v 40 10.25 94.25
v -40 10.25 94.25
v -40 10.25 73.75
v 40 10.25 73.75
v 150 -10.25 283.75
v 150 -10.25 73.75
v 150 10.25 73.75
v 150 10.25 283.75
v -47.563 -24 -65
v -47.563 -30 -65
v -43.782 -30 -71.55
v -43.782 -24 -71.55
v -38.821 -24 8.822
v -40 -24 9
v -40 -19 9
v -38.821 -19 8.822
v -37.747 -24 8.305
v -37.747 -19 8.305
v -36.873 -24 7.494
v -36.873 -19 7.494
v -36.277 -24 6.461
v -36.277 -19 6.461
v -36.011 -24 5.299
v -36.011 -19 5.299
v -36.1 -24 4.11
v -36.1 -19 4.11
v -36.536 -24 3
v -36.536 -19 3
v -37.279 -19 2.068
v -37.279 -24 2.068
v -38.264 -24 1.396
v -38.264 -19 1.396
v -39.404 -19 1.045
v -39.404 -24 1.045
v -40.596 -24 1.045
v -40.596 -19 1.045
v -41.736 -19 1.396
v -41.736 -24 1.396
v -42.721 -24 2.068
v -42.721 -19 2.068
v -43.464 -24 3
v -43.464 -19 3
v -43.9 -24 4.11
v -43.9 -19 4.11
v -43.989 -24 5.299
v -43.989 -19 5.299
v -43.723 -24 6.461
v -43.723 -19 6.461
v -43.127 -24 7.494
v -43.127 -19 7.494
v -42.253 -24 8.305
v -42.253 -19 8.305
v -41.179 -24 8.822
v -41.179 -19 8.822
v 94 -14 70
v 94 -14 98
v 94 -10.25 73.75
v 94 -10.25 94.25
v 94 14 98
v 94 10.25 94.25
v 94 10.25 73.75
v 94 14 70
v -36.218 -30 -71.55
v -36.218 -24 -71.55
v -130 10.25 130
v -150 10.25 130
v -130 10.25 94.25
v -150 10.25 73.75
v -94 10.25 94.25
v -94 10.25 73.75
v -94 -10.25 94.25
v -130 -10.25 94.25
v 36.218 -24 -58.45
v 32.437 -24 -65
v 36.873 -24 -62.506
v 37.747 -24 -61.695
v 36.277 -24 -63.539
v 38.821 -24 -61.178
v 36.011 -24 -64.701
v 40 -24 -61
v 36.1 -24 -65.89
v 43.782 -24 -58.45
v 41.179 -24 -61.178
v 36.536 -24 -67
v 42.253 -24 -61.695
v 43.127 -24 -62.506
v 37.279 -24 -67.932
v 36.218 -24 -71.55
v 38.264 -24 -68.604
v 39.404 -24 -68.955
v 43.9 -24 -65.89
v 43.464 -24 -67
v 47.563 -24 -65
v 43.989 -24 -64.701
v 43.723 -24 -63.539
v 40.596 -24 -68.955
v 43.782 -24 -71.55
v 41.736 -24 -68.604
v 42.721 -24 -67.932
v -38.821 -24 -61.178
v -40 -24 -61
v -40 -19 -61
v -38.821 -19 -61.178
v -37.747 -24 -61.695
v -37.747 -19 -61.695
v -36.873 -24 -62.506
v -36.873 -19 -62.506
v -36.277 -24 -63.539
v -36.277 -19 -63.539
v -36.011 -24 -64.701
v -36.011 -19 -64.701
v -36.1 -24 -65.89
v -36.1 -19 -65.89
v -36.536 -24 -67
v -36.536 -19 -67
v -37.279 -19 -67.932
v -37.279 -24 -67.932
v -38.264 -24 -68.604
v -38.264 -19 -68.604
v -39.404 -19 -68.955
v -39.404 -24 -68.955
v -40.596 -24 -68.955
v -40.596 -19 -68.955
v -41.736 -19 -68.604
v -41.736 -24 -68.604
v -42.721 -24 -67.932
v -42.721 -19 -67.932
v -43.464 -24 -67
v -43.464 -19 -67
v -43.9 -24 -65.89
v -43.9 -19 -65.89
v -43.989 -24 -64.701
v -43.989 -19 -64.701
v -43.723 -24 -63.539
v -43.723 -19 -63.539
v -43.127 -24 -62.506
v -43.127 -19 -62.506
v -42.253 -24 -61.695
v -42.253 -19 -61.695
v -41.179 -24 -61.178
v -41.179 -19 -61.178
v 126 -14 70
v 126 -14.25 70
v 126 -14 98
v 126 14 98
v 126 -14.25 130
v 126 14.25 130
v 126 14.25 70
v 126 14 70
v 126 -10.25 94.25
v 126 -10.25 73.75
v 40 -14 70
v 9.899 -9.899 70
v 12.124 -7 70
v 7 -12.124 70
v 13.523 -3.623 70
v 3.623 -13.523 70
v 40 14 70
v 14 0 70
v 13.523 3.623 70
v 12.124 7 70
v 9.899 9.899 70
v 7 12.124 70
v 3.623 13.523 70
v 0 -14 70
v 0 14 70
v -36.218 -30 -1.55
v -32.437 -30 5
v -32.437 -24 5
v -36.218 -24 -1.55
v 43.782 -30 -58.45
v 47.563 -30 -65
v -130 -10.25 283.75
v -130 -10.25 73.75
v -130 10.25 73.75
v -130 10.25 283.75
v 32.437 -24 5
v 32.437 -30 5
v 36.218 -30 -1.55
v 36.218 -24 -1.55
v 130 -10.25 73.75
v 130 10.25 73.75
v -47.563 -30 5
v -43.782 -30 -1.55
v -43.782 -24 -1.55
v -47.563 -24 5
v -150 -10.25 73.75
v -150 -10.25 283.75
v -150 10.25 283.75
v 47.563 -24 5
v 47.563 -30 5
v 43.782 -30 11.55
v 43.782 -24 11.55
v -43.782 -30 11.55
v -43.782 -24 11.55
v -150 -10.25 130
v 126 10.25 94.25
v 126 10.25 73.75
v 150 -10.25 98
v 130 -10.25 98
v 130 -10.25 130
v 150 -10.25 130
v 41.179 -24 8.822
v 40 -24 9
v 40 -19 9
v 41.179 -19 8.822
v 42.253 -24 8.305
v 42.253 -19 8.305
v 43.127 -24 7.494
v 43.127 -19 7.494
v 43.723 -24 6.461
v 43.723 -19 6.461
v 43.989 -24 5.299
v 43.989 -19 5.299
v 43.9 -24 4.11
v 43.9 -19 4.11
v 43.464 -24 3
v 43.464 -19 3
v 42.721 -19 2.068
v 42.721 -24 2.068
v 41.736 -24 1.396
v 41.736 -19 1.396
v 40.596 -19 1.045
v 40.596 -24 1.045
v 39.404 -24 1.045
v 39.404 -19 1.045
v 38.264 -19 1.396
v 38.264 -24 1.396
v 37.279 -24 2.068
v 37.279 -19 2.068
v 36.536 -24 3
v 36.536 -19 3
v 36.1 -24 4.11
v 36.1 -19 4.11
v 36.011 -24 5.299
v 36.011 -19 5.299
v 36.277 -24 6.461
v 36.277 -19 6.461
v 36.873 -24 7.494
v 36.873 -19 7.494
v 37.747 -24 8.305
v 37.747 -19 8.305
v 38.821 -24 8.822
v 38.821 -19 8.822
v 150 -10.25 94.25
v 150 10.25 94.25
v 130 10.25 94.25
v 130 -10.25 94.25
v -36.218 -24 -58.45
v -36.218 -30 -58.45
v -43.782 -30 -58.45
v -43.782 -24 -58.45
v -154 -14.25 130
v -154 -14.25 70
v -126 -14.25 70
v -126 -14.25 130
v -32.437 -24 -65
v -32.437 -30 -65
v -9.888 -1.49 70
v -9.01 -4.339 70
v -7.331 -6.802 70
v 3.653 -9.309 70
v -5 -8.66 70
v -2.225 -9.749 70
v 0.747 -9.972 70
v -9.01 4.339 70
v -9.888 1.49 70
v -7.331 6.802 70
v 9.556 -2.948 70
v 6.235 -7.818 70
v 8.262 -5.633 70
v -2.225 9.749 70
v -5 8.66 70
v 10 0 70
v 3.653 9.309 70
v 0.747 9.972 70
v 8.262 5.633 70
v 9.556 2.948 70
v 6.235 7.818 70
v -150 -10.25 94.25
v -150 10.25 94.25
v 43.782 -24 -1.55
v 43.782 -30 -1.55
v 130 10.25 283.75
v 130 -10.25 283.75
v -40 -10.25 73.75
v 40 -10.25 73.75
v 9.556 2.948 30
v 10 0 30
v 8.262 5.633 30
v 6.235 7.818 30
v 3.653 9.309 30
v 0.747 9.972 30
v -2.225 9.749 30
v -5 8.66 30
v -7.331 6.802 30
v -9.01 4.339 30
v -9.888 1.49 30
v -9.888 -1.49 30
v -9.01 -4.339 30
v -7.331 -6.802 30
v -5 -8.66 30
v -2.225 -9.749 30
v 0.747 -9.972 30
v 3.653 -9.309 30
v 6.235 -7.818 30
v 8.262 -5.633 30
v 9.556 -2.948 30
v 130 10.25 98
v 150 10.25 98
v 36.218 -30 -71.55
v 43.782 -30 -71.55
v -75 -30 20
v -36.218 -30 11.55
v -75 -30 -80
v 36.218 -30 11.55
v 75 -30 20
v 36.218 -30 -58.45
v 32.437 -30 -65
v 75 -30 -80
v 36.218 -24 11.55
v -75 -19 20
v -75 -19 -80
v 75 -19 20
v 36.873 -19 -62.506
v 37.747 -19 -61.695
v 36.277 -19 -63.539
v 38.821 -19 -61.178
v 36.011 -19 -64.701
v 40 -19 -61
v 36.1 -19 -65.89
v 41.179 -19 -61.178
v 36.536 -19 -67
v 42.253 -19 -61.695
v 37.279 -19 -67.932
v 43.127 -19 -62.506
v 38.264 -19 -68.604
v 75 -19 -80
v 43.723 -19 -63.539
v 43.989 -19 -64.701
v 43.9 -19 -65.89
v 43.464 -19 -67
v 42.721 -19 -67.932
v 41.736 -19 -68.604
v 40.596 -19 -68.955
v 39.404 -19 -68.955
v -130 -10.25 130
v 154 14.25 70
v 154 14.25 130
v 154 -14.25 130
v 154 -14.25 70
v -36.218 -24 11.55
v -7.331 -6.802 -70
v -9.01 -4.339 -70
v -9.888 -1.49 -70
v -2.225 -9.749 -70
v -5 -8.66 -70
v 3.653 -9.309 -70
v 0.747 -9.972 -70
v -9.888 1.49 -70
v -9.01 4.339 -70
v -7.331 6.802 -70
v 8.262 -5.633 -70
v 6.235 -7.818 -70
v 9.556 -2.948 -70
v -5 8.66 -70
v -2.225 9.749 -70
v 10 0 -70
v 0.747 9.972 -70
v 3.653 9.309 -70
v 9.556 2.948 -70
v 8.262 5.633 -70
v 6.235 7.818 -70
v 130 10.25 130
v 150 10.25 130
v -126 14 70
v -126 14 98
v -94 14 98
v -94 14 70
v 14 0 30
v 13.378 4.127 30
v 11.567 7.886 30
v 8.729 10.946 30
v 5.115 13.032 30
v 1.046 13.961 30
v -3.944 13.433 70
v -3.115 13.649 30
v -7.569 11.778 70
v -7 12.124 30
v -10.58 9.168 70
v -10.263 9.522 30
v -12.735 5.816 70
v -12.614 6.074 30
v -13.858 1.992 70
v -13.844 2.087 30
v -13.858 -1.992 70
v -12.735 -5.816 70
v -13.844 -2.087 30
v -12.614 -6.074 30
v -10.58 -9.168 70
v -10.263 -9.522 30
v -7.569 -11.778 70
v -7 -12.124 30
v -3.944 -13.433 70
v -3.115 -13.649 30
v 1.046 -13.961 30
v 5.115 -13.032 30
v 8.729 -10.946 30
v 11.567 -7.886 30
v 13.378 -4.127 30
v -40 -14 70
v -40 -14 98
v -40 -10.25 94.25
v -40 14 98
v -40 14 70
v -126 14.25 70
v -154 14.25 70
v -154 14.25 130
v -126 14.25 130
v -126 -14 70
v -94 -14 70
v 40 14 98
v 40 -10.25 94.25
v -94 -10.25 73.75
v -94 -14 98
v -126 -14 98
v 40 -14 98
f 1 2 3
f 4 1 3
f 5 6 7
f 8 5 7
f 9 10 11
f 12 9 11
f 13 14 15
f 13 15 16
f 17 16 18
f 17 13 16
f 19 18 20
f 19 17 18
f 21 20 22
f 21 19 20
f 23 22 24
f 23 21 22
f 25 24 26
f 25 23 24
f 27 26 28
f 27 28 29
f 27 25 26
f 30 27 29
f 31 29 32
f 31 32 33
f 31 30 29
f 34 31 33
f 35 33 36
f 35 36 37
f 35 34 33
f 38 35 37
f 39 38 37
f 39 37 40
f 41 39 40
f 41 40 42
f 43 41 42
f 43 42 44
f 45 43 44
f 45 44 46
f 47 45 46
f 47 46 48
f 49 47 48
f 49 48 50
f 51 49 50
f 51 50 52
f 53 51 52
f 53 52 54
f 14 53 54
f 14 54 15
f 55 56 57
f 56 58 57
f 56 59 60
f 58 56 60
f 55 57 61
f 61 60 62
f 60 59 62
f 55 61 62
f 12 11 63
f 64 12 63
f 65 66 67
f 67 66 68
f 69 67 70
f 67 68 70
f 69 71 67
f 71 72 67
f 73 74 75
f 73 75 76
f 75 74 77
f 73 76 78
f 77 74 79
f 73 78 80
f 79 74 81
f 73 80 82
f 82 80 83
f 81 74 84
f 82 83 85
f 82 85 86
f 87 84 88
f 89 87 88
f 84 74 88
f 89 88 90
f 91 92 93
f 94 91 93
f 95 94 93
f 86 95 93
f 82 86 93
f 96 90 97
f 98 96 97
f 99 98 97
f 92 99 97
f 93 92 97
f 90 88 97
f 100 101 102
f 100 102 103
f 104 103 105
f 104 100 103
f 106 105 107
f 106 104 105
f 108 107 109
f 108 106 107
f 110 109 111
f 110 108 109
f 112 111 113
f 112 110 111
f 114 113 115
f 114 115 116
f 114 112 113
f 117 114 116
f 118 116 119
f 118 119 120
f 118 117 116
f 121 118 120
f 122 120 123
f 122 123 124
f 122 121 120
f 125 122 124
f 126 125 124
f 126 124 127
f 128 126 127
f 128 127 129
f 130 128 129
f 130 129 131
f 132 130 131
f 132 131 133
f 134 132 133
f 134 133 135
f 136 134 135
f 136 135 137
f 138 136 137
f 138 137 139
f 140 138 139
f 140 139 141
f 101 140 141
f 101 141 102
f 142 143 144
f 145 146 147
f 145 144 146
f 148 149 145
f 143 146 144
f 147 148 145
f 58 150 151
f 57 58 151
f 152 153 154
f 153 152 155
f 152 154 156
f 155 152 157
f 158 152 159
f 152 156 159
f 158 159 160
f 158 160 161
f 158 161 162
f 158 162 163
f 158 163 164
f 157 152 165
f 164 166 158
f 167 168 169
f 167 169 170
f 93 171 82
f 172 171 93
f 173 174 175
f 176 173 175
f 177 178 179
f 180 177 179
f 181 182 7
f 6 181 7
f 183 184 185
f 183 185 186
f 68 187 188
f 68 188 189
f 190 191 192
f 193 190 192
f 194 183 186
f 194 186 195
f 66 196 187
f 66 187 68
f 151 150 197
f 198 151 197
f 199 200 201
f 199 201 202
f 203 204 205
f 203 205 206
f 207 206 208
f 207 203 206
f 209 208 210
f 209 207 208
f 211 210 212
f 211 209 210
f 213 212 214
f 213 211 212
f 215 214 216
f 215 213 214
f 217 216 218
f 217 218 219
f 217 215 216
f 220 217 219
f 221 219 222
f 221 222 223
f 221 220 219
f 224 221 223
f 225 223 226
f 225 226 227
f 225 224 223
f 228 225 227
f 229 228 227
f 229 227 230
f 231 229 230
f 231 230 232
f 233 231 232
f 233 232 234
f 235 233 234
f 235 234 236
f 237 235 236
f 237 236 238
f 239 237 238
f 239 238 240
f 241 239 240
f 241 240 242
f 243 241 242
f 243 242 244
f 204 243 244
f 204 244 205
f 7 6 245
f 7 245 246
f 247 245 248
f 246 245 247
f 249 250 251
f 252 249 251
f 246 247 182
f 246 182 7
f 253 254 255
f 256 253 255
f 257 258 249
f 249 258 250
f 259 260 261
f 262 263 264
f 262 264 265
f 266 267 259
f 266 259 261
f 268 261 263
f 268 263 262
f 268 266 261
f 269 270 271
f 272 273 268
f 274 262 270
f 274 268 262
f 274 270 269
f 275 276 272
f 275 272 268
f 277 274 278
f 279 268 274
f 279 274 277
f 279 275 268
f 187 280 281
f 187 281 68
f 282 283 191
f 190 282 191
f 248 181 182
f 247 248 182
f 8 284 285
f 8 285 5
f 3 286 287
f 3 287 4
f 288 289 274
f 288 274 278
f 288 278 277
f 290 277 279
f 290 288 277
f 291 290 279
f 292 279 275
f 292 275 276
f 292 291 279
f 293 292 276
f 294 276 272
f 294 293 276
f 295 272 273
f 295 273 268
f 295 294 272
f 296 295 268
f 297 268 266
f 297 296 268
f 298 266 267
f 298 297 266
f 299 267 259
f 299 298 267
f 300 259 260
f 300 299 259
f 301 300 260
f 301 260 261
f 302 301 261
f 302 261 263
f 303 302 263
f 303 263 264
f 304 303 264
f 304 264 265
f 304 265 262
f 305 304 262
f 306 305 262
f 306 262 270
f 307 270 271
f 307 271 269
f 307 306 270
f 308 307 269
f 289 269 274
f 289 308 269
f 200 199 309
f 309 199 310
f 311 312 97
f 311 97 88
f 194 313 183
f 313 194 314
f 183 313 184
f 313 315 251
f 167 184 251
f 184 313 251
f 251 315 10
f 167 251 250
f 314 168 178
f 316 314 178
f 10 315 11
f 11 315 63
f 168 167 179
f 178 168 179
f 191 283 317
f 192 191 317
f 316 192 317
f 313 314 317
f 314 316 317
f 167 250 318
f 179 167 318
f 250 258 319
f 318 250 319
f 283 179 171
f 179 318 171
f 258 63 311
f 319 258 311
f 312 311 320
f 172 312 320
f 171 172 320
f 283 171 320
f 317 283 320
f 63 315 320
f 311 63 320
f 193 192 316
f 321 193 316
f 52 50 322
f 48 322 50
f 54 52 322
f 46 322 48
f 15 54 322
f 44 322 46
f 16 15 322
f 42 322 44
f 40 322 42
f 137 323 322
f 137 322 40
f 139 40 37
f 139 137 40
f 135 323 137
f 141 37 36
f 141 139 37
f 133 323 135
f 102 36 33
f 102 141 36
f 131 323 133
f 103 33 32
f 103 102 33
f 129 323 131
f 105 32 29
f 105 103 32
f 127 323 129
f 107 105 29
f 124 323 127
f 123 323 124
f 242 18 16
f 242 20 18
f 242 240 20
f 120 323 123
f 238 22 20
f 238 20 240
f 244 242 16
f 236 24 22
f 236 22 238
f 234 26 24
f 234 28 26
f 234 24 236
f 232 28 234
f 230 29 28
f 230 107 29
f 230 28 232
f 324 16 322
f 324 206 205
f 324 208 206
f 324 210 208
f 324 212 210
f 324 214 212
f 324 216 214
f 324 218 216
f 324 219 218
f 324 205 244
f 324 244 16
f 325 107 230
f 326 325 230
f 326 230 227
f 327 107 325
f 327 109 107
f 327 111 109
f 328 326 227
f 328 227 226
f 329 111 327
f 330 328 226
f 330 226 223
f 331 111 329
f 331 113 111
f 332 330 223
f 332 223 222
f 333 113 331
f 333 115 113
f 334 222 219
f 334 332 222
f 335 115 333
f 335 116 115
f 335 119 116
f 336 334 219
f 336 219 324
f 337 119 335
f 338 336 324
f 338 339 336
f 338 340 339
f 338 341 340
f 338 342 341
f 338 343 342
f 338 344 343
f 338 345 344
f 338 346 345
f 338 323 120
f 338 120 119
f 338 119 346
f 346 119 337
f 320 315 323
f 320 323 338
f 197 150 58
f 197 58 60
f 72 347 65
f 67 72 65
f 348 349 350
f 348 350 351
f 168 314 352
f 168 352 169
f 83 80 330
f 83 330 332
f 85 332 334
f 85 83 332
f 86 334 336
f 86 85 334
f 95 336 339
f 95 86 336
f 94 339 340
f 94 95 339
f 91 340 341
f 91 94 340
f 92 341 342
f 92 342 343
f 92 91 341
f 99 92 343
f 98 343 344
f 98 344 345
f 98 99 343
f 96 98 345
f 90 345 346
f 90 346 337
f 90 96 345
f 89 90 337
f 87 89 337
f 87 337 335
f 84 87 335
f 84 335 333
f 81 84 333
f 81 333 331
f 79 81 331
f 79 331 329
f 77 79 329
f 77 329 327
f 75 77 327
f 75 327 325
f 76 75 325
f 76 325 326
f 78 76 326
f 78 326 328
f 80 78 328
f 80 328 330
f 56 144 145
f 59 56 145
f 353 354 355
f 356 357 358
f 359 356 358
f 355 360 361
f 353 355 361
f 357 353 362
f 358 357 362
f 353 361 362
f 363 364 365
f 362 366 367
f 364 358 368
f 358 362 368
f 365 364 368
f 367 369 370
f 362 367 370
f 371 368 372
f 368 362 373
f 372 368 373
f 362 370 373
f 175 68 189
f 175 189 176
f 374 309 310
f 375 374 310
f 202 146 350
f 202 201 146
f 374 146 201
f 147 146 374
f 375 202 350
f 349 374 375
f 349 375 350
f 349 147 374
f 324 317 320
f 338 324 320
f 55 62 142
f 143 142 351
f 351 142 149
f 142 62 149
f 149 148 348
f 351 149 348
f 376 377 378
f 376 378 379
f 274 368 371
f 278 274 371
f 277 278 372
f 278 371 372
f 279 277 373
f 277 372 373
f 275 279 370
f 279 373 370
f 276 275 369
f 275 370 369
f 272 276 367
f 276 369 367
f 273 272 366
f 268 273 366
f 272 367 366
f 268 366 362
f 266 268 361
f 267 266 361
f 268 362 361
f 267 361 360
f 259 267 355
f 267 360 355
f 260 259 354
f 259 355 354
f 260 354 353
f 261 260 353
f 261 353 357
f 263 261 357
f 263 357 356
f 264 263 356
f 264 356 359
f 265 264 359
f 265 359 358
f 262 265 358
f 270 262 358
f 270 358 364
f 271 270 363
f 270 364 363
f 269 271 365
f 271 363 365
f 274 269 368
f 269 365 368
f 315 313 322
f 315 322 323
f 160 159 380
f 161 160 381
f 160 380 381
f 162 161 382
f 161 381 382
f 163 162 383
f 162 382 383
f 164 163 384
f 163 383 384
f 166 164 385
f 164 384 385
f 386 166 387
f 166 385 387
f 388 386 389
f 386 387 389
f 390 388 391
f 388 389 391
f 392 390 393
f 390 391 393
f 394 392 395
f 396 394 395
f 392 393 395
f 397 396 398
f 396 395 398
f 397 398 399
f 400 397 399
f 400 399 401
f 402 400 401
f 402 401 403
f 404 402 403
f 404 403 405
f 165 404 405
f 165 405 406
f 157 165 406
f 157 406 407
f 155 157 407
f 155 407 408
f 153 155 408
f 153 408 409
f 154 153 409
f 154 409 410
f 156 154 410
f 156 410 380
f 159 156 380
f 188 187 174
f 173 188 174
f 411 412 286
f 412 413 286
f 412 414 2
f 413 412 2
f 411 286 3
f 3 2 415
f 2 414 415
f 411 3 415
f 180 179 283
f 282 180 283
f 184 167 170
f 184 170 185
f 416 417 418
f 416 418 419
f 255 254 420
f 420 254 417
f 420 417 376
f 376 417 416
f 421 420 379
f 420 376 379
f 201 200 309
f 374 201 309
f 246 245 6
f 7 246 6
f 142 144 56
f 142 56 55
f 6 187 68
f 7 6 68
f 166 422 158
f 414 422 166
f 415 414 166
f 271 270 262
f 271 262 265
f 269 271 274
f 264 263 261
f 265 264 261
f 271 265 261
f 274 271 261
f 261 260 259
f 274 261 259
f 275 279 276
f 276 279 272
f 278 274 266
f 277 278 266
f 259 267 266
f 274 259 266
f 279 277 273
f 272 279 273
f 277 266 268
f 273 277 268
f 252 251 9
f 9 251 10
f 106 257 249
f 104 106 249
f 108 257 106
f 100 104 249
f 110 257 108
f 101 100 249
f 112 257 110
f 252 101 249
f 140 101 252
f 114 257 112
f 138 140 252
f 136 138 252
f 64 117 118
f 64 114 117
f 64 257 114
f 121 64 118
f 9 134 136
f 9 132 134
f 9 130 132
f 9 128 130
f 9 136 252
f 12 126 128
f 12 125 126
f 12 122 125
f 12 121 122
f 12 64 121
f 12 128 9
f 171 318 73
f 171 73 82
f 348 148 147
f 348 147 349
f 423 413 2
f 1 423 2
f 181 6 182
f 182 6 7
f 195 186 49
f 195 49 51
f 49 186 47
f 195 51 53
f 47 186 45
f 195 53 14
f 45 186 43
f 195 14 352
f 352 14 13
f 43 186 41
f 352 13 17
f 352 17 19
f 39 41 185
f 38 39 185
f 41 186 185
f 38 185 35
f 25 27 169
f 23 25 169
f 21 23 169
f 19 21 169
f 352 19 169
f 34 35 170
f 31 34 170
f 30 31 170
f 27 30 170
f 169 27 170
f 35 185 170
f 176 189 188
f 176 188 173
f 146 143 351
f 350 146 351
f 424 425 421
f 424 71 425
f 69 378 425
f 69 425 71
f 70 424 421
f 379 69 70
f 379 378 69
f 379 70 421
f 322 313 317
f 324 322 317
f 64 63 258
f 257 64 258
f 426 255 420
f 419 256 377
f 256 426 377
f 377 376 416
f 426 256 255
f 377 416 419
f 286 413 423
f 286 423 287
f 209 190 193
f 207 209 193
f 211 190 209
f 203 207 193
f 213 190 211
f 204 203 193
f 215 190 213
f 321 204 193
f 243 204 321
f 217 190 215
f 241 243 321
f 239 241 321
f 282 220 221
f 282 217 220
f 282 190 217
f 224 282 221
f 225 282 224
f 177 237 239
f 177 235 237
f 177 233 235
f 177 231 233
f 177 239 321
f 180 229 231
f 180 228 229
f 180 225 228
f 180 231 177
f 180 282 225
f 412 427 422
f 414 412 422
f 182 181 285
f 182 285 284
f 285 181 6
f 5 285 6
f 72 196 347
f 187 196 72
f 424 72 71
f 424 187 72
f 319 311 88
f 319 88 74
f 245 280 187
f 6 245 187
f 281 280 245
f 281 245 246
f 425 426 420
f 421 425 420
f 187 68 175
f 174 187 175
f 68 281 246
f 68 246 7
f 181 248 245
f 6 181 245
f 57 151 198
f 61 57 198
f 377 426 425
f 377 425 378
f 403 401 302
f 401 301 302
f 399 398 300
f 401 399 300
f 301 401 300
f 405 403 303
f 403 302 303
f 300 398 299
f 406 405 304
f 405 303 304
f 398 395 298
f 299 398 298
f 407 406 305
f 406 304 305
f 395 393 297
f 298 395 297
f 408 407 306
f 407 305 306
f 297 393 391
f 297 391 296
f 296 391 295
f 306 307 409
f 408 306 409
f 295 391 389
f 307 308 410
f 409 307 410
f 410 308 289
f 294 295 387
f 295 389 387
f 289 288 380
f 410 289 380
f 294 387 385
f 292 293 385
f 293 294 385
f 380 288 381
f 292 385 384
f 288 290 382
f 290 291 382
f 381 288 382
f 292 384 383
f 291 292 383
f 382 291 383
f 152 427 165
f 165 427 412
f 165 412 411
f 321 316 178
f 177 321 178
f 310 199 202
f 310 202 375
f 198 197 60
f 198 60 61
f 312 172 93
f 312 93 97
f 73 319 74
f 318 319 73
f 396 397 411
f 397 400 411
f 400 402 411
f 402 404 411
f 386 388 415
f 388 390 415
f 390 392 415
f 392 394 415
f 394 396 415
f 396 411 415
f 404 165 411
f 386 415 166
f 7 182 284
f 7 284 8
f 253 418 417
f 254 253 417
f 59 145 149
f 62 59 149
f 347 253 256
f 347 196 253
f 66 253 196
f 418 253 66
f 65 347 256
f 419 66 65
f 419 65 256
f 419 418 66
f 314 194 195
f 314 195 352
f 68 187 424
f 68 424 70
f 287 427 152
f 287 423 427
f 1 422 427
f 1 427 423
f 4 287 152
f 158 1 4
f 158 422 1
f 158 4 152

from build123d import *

# Parameters (mm, degrees)
SALIENTE_EXTRUIR1_DEPTH      = 70
SALIENTE_EXTRUIR1_DEPTH_BACK = 70
CROQUIS1_R                   = 10
SALIENTE_EXTRUIR2_START      = 30
CROQUIS2_R                   = 14
CROQUIS2_R_2                 = 10
SALIENTE_EXTRUIR2_DEPTH      = 40
SALIENTE_EXTRUIR3_DEPTH      = 150
SALIENTE_EXTRUIR3_DEPTH_BACK = 150
CROQUIS3_W                   = 20.5
CROQUIS3_H                   = 20.5
SALIENTE_EXTRUIR4_DEPTH      = 40
SALIENTE_EXTRUIR4_DEPTH_BACK = 40
CROQUIS3_3_W                 = 28
CROQUIS3_3_H                 = 28
CROQUIS3_3_W_2               = 20.5
CROQUIS3_3_H_2               = 20.5
SALIENTE_EXTRUIR5_START      = 73.75
CROQUIS4_W                   = 20
CROQUIS4_H                   = 20.5
SALIENTE_EXTRUIR5_DEPTH      = 210
SALIENTE_EXTRUIR5_2_DEPTH    = 210
SALIENTE_EXTRUIR6_START      = 70
CROQUIS4_3_W                 = 28
CROQUIS4_3_H                 = 28.5
CROQUIS4_3_W_2               = 20
CROQUIS4_3_H_2               = 20.5
SALIENTE_EXTRUIR6_DEPTH      = 60
SALIENTE_EXTRUIR6_2_DEPTH    = 60
SALIENTE_EXTRUIR7_START      = -154
CROQUIS3_4_W                 = 28
CROQUIS3_4_H                 = 28
CROQUIS3_4_W_2               = 20.5
CROQUIS3_4_H_2               = 20.5
SALIENTE_EXTRUIR7_DEPTH      = 60
SALIENTE_EXTRUIR8_START      = 154
CROQUIS3_5_W                 = 28
CROQUIS3_5_H                 = 28
CROQUIS3_5_W_2               = 20.5
CROQUIS3_5_H_2               = 20.5
SALIENTE_EXTRUIR8_DEPTH      = 60
SALIENTE_EXTRUIR9_START      = -30
CROQUIS5_W                   = 150
CROQUIS5_H                   = 100
CROQUIS5_R                   = 4
SALIENTE_EXTRUIR9_DEPTH      = 11
INDENTACI_N1_START           = -130
INDENTACI_N1_OUTLINE_W       = 20.5
INDENTACI_N1_OUTLINE_H       = 20.5
INDENTACI_N1_DEPTH           = 4
INDENTACI_N1_START_2         = -150
INDENTACI_N1_2_OUTLINE_W     = 20.5
INDENTACI_N1_2_OUTLINE_H     = 3.75
INDENTACI_N1_2_DEPTH         = 20
CORTAR_EXTRUIR1_START        = -30
CORTAR_EXTRUIR1_DEPTH        = 6


# Read off the part's stored shape, not the designer's step: Indentación1
with BuildPart() as part:
    # Croquis1 → Saliente-Extruir1 (new, two sides: drawn at the far end of the back side and taken through both)
    with BuildSketch(Plane.XY.offset(-SALIENTE_EXTRUIR1_DEPTH_BACK)):
        Circle(CROQUIS1_R)
    extrude(amount=SALIENTE_EXTRUIR1_DEPTH + SALIENTE_EXTRUIR1_DEPTH_BACK)


with BuildPart() as body_2:
    # Croquis2 → Saliente-Extruir2 (new body)
    with BuildSketch(Plane.XY.offset(SALIENTE_EXTRUIR2_START)):
        Circle(CROQUIS2_R)
        Circle(CROQUIS2_R_2, mode=Mode.SUBTRACT)
    extrude(amount=SALIENTE_EXTRUIR2_DEPTH)

    # Croquis3<3> → Saliente-Extruir4 (add, two sides: drawn at the far end of the back side and taken through both)
    with BuildSketch(Plane(origin=(0, 0, 0), x_dir=(0, 0, -1), z_dir=(1, 0, 0)).offset(-SALIENTE_EXTRUIR4_DEPTH_BACK)):
        with Locations((-84, 0)):
            Rectangle(CROQUIS3_3_W, CROQUIS3_3_H)
        with Locations((-84, 0)):
            Rectangle(CROQUIS3_3_W_2, CROQUIS3_3_H_2, mode=Mode.SUBTRACT)
    extrude(amount=SALIENTE_EXTRUIR4_DEPTH + SALIENTE_EXTRUIR4_DEPTH_BACK)


with BuildPart() as body_3:
    # Croquis3 → Saliente-Extruir3 (new, two sides: drawn at the far end of the back side and taken through both)
    with BuildSketch(Plane(origin=(0, 0, 0), x_dir=(0, 0, -1), z_dir=(1, 0, 0)).offset(-SALIENTE_EXTRUIR3_DEPTH_BACK)):
        with Locations((-84, 0)):
            Rectangle(CROQUIS3_W, CROQUIS3_H)
    extrude(amount=SALIENTE_EXTRUIR3_DEPTH + SALIENTE_EXTRUIR3_DEPTH_BACK)


with BuildPart() as body_4:
    # Croquis4 → Saliente-Extruir5 (new body)
    with BuildSketch(Plane.XY.offset(SALIENTE_EXTRUIR5_START)):
        with Locations((-140, 0)):
            Rectangle(CROQUIS4_W, CROQUIS4_H)
    extrude(amount=SALIENTE_EXTRUIR5_DEPTH)


with BuildPart() as body_5:
    # Croquis4 → Saliente-Extruir5 2 (new body)
    with BuildSketch(Plane.XY.offset(SALIENTE_EXTRUIR5_START)):
        with Locations((140, 0)):
            Rectangle(CROQUIS4_W, CROQUIS4_H)
    extrude(amount=SALIENTE_EXTRUIR5_2_DEPTH)


with BuildPart() as body_6:
    # Croquis4<3> → Saliente-Extruir6 (new body)
    with BuildSketch(Plane.XY.offset(SALIENTE_EXTRUIR6_START)):
        with Locations((-140, 0)):
            Rectangle(CROQUIS4_3_W, CROQUIS4_3_H)
        with Locations((-140, 0)):
            Rectangle(CROQUIS4_3_W_2, CROQUIS4_3_H_2, mode=Mode.SUBTRACT)
    extrude(amount=SALIENTE_EXTRUIR6_DEPTH)

    # Croquis3<4> → Saliente-Extruir7 (add)
    with BuildSketch(Plane(origin=(0, 0, 0), x_dir=(0, 0, -1), z_dir=(1, 0, 0)).offset(SALIENTE_EXTRUIR7_START)):
        with Locations((-84, 0)):
            Rectangle(CROQUIS3_4_W, CROQUIS3_4_H)
        with Locations((-84, 0)):
            Rectangle(CROQUIS3_4_W_2, CROQUIS3_4_H_2, mode=Mode.SUBTRACT)
    extrude(amount=SALIENTE_EXTRUIR7_DEPTH)

    # Indentación1 outline → Indentación1 (cut)
    with BuildSketch(Plane.YZ.offset(INDENTACI_N1_START)):
        with Locations((0, 84)):
            Rectangle(INDENTACI_N1_OUTLINE_W, INDENTACI_N1_OUTLINE_H)
    extrude(amount=INDENTACI_N1_DEPTH, mode=Mode.SUBTRACT)

    # Indentaci_n1 2 outline → Indentaci_n1 2 (cut)
    with BuildSketch(Plane.YZ.offset(INDENTACI_N1_START_2)):
        with Locations((0, 96.125)):
            Rectangle(INDENTACI_N1_2_OUTLINE_W, INDENTACI_N1_2_OUTLINE_H)
    extrude(amount=INDENTACI_N1_2_DEPTH, mode=Mode.SUBTRACT)


with BuildPart() as body_7:
    # Croquis4<3> → Saliente-Extruir6 2 (new body)
    with BuildSketch(Plane.XY.offset(SALIENTE_EXTRUIR6_START)):
        with Locations((140, 0)):
            Rectangle(CROQUIS4_3_W, CROQUIS4_3_H)
        with Locations((140, 0)):
            Rectangle(CROQUIS4_3_W_2, CROQUIS4_3_H_2, mode=Mode.SUBTRACT)
    extrude(amount=SALIENTE_EXTRUIR6_2_DEPTH)

    # Croquis3<5> → Saliente-Extruir8 (add)
    with BuildSketch(Plane(origin=(0, 0, 0), x_dir=(0, 0, -1), z_dir=(1, 0, 0)).offset(SALIENTE_EXTRUIR8_START)):
        with Locations((-84, 0)):
            Rectangle(CROQUIS3_5_W, CROQUIS3_5_H)
        with Locations((-84, 0)):
            Rectangle(CROQUIS3_5_W_2, CROQUIS3_5_H_2, mode=Mode.SUBTRACT)
    extrude(amount=-SALIENTE_EXTRUIR8_DEPTH)


with BuildPart() as body_8:
    # Croquis5 → Saliente-Extruir9 (new body)
    with BuildSketch(Plane(origin=(0, 0, 0), x_dir=(1, 0, 0), z_dir=(0, 1, 0)).offset(SALIENTE_EXTRUIR9_START)):
        with Locations((0, 30)):
            Rectangle(CROQUIS5_W, CROQUIS5_H)
        with Locations(Location((40, 65, 0), (0, 0, 270))):
            Circle(CROQUIS5_R, mode=Mode.SUBTRACT)
        with Locations(Location((40, -5, 0), (0, 0, 270))):
            Circle(CROQUIS5_R, mode=Mode.SUBTRACT)
        with Locations(Location((-40, -5, 0), (0, 0, 270))):
            Circle(CROQUIS5_R, mode=Mode.SUBTRACT)
        with Locations(Location((-40, 65, 0), (0, 0, 270))):
            Circle(CROQUIS5_R, mode=Mode.SUBTRACT)
    extrude(amount=SALIENTE_EXTRUIR9_DEPTH)

    # Croquis6 → Cortar-Extruir1 (cut)
    with BuildSketch(Plane(origin=(0, 0, 0), x_dir=(1, 0, 0), z_dir=(0, 1, 0)).offset(CORTAR_EXTRUIR1_START)):
        Polygon((-36.218355737, -11.55), (-32.436711474, -5), (-36.218355737, 1.55), (-43.781644263, 1.55), (-47.563288526, -5), (-43.781644263, -11.55), align=None)
        Polygon((47.563288526, -5), (43.781644263, -11.55), (36.218355737, -11.55), (32.436711474, -5), (36.218355737, 1.55), (43.781644263, 1.55), align=None)
        Polygon((36.218355737, 71.55), (32.436711474, 65), (36.218355737, 58.45), (43.781644263, 58.45), (47.563288526, 65), (43.781644263, 71.55), align=None)
        Polygon((-47.563288526, 65), (-43.781644263, 71.55), (-36.218355737, 71.55), (-32.436711474, 65), (-36.218355737, 58.45), (-43.781644263, 58.45), align=None)
    extrude(amount=CORTAR_EXTRUIR1_DEPTH, mode=Mode.SUBTRACT)


solid = Compound([part.part, body_2.part, body_3.part, body_4.part, body_5.part, body_6.part, body_7.part, body_8.part])
